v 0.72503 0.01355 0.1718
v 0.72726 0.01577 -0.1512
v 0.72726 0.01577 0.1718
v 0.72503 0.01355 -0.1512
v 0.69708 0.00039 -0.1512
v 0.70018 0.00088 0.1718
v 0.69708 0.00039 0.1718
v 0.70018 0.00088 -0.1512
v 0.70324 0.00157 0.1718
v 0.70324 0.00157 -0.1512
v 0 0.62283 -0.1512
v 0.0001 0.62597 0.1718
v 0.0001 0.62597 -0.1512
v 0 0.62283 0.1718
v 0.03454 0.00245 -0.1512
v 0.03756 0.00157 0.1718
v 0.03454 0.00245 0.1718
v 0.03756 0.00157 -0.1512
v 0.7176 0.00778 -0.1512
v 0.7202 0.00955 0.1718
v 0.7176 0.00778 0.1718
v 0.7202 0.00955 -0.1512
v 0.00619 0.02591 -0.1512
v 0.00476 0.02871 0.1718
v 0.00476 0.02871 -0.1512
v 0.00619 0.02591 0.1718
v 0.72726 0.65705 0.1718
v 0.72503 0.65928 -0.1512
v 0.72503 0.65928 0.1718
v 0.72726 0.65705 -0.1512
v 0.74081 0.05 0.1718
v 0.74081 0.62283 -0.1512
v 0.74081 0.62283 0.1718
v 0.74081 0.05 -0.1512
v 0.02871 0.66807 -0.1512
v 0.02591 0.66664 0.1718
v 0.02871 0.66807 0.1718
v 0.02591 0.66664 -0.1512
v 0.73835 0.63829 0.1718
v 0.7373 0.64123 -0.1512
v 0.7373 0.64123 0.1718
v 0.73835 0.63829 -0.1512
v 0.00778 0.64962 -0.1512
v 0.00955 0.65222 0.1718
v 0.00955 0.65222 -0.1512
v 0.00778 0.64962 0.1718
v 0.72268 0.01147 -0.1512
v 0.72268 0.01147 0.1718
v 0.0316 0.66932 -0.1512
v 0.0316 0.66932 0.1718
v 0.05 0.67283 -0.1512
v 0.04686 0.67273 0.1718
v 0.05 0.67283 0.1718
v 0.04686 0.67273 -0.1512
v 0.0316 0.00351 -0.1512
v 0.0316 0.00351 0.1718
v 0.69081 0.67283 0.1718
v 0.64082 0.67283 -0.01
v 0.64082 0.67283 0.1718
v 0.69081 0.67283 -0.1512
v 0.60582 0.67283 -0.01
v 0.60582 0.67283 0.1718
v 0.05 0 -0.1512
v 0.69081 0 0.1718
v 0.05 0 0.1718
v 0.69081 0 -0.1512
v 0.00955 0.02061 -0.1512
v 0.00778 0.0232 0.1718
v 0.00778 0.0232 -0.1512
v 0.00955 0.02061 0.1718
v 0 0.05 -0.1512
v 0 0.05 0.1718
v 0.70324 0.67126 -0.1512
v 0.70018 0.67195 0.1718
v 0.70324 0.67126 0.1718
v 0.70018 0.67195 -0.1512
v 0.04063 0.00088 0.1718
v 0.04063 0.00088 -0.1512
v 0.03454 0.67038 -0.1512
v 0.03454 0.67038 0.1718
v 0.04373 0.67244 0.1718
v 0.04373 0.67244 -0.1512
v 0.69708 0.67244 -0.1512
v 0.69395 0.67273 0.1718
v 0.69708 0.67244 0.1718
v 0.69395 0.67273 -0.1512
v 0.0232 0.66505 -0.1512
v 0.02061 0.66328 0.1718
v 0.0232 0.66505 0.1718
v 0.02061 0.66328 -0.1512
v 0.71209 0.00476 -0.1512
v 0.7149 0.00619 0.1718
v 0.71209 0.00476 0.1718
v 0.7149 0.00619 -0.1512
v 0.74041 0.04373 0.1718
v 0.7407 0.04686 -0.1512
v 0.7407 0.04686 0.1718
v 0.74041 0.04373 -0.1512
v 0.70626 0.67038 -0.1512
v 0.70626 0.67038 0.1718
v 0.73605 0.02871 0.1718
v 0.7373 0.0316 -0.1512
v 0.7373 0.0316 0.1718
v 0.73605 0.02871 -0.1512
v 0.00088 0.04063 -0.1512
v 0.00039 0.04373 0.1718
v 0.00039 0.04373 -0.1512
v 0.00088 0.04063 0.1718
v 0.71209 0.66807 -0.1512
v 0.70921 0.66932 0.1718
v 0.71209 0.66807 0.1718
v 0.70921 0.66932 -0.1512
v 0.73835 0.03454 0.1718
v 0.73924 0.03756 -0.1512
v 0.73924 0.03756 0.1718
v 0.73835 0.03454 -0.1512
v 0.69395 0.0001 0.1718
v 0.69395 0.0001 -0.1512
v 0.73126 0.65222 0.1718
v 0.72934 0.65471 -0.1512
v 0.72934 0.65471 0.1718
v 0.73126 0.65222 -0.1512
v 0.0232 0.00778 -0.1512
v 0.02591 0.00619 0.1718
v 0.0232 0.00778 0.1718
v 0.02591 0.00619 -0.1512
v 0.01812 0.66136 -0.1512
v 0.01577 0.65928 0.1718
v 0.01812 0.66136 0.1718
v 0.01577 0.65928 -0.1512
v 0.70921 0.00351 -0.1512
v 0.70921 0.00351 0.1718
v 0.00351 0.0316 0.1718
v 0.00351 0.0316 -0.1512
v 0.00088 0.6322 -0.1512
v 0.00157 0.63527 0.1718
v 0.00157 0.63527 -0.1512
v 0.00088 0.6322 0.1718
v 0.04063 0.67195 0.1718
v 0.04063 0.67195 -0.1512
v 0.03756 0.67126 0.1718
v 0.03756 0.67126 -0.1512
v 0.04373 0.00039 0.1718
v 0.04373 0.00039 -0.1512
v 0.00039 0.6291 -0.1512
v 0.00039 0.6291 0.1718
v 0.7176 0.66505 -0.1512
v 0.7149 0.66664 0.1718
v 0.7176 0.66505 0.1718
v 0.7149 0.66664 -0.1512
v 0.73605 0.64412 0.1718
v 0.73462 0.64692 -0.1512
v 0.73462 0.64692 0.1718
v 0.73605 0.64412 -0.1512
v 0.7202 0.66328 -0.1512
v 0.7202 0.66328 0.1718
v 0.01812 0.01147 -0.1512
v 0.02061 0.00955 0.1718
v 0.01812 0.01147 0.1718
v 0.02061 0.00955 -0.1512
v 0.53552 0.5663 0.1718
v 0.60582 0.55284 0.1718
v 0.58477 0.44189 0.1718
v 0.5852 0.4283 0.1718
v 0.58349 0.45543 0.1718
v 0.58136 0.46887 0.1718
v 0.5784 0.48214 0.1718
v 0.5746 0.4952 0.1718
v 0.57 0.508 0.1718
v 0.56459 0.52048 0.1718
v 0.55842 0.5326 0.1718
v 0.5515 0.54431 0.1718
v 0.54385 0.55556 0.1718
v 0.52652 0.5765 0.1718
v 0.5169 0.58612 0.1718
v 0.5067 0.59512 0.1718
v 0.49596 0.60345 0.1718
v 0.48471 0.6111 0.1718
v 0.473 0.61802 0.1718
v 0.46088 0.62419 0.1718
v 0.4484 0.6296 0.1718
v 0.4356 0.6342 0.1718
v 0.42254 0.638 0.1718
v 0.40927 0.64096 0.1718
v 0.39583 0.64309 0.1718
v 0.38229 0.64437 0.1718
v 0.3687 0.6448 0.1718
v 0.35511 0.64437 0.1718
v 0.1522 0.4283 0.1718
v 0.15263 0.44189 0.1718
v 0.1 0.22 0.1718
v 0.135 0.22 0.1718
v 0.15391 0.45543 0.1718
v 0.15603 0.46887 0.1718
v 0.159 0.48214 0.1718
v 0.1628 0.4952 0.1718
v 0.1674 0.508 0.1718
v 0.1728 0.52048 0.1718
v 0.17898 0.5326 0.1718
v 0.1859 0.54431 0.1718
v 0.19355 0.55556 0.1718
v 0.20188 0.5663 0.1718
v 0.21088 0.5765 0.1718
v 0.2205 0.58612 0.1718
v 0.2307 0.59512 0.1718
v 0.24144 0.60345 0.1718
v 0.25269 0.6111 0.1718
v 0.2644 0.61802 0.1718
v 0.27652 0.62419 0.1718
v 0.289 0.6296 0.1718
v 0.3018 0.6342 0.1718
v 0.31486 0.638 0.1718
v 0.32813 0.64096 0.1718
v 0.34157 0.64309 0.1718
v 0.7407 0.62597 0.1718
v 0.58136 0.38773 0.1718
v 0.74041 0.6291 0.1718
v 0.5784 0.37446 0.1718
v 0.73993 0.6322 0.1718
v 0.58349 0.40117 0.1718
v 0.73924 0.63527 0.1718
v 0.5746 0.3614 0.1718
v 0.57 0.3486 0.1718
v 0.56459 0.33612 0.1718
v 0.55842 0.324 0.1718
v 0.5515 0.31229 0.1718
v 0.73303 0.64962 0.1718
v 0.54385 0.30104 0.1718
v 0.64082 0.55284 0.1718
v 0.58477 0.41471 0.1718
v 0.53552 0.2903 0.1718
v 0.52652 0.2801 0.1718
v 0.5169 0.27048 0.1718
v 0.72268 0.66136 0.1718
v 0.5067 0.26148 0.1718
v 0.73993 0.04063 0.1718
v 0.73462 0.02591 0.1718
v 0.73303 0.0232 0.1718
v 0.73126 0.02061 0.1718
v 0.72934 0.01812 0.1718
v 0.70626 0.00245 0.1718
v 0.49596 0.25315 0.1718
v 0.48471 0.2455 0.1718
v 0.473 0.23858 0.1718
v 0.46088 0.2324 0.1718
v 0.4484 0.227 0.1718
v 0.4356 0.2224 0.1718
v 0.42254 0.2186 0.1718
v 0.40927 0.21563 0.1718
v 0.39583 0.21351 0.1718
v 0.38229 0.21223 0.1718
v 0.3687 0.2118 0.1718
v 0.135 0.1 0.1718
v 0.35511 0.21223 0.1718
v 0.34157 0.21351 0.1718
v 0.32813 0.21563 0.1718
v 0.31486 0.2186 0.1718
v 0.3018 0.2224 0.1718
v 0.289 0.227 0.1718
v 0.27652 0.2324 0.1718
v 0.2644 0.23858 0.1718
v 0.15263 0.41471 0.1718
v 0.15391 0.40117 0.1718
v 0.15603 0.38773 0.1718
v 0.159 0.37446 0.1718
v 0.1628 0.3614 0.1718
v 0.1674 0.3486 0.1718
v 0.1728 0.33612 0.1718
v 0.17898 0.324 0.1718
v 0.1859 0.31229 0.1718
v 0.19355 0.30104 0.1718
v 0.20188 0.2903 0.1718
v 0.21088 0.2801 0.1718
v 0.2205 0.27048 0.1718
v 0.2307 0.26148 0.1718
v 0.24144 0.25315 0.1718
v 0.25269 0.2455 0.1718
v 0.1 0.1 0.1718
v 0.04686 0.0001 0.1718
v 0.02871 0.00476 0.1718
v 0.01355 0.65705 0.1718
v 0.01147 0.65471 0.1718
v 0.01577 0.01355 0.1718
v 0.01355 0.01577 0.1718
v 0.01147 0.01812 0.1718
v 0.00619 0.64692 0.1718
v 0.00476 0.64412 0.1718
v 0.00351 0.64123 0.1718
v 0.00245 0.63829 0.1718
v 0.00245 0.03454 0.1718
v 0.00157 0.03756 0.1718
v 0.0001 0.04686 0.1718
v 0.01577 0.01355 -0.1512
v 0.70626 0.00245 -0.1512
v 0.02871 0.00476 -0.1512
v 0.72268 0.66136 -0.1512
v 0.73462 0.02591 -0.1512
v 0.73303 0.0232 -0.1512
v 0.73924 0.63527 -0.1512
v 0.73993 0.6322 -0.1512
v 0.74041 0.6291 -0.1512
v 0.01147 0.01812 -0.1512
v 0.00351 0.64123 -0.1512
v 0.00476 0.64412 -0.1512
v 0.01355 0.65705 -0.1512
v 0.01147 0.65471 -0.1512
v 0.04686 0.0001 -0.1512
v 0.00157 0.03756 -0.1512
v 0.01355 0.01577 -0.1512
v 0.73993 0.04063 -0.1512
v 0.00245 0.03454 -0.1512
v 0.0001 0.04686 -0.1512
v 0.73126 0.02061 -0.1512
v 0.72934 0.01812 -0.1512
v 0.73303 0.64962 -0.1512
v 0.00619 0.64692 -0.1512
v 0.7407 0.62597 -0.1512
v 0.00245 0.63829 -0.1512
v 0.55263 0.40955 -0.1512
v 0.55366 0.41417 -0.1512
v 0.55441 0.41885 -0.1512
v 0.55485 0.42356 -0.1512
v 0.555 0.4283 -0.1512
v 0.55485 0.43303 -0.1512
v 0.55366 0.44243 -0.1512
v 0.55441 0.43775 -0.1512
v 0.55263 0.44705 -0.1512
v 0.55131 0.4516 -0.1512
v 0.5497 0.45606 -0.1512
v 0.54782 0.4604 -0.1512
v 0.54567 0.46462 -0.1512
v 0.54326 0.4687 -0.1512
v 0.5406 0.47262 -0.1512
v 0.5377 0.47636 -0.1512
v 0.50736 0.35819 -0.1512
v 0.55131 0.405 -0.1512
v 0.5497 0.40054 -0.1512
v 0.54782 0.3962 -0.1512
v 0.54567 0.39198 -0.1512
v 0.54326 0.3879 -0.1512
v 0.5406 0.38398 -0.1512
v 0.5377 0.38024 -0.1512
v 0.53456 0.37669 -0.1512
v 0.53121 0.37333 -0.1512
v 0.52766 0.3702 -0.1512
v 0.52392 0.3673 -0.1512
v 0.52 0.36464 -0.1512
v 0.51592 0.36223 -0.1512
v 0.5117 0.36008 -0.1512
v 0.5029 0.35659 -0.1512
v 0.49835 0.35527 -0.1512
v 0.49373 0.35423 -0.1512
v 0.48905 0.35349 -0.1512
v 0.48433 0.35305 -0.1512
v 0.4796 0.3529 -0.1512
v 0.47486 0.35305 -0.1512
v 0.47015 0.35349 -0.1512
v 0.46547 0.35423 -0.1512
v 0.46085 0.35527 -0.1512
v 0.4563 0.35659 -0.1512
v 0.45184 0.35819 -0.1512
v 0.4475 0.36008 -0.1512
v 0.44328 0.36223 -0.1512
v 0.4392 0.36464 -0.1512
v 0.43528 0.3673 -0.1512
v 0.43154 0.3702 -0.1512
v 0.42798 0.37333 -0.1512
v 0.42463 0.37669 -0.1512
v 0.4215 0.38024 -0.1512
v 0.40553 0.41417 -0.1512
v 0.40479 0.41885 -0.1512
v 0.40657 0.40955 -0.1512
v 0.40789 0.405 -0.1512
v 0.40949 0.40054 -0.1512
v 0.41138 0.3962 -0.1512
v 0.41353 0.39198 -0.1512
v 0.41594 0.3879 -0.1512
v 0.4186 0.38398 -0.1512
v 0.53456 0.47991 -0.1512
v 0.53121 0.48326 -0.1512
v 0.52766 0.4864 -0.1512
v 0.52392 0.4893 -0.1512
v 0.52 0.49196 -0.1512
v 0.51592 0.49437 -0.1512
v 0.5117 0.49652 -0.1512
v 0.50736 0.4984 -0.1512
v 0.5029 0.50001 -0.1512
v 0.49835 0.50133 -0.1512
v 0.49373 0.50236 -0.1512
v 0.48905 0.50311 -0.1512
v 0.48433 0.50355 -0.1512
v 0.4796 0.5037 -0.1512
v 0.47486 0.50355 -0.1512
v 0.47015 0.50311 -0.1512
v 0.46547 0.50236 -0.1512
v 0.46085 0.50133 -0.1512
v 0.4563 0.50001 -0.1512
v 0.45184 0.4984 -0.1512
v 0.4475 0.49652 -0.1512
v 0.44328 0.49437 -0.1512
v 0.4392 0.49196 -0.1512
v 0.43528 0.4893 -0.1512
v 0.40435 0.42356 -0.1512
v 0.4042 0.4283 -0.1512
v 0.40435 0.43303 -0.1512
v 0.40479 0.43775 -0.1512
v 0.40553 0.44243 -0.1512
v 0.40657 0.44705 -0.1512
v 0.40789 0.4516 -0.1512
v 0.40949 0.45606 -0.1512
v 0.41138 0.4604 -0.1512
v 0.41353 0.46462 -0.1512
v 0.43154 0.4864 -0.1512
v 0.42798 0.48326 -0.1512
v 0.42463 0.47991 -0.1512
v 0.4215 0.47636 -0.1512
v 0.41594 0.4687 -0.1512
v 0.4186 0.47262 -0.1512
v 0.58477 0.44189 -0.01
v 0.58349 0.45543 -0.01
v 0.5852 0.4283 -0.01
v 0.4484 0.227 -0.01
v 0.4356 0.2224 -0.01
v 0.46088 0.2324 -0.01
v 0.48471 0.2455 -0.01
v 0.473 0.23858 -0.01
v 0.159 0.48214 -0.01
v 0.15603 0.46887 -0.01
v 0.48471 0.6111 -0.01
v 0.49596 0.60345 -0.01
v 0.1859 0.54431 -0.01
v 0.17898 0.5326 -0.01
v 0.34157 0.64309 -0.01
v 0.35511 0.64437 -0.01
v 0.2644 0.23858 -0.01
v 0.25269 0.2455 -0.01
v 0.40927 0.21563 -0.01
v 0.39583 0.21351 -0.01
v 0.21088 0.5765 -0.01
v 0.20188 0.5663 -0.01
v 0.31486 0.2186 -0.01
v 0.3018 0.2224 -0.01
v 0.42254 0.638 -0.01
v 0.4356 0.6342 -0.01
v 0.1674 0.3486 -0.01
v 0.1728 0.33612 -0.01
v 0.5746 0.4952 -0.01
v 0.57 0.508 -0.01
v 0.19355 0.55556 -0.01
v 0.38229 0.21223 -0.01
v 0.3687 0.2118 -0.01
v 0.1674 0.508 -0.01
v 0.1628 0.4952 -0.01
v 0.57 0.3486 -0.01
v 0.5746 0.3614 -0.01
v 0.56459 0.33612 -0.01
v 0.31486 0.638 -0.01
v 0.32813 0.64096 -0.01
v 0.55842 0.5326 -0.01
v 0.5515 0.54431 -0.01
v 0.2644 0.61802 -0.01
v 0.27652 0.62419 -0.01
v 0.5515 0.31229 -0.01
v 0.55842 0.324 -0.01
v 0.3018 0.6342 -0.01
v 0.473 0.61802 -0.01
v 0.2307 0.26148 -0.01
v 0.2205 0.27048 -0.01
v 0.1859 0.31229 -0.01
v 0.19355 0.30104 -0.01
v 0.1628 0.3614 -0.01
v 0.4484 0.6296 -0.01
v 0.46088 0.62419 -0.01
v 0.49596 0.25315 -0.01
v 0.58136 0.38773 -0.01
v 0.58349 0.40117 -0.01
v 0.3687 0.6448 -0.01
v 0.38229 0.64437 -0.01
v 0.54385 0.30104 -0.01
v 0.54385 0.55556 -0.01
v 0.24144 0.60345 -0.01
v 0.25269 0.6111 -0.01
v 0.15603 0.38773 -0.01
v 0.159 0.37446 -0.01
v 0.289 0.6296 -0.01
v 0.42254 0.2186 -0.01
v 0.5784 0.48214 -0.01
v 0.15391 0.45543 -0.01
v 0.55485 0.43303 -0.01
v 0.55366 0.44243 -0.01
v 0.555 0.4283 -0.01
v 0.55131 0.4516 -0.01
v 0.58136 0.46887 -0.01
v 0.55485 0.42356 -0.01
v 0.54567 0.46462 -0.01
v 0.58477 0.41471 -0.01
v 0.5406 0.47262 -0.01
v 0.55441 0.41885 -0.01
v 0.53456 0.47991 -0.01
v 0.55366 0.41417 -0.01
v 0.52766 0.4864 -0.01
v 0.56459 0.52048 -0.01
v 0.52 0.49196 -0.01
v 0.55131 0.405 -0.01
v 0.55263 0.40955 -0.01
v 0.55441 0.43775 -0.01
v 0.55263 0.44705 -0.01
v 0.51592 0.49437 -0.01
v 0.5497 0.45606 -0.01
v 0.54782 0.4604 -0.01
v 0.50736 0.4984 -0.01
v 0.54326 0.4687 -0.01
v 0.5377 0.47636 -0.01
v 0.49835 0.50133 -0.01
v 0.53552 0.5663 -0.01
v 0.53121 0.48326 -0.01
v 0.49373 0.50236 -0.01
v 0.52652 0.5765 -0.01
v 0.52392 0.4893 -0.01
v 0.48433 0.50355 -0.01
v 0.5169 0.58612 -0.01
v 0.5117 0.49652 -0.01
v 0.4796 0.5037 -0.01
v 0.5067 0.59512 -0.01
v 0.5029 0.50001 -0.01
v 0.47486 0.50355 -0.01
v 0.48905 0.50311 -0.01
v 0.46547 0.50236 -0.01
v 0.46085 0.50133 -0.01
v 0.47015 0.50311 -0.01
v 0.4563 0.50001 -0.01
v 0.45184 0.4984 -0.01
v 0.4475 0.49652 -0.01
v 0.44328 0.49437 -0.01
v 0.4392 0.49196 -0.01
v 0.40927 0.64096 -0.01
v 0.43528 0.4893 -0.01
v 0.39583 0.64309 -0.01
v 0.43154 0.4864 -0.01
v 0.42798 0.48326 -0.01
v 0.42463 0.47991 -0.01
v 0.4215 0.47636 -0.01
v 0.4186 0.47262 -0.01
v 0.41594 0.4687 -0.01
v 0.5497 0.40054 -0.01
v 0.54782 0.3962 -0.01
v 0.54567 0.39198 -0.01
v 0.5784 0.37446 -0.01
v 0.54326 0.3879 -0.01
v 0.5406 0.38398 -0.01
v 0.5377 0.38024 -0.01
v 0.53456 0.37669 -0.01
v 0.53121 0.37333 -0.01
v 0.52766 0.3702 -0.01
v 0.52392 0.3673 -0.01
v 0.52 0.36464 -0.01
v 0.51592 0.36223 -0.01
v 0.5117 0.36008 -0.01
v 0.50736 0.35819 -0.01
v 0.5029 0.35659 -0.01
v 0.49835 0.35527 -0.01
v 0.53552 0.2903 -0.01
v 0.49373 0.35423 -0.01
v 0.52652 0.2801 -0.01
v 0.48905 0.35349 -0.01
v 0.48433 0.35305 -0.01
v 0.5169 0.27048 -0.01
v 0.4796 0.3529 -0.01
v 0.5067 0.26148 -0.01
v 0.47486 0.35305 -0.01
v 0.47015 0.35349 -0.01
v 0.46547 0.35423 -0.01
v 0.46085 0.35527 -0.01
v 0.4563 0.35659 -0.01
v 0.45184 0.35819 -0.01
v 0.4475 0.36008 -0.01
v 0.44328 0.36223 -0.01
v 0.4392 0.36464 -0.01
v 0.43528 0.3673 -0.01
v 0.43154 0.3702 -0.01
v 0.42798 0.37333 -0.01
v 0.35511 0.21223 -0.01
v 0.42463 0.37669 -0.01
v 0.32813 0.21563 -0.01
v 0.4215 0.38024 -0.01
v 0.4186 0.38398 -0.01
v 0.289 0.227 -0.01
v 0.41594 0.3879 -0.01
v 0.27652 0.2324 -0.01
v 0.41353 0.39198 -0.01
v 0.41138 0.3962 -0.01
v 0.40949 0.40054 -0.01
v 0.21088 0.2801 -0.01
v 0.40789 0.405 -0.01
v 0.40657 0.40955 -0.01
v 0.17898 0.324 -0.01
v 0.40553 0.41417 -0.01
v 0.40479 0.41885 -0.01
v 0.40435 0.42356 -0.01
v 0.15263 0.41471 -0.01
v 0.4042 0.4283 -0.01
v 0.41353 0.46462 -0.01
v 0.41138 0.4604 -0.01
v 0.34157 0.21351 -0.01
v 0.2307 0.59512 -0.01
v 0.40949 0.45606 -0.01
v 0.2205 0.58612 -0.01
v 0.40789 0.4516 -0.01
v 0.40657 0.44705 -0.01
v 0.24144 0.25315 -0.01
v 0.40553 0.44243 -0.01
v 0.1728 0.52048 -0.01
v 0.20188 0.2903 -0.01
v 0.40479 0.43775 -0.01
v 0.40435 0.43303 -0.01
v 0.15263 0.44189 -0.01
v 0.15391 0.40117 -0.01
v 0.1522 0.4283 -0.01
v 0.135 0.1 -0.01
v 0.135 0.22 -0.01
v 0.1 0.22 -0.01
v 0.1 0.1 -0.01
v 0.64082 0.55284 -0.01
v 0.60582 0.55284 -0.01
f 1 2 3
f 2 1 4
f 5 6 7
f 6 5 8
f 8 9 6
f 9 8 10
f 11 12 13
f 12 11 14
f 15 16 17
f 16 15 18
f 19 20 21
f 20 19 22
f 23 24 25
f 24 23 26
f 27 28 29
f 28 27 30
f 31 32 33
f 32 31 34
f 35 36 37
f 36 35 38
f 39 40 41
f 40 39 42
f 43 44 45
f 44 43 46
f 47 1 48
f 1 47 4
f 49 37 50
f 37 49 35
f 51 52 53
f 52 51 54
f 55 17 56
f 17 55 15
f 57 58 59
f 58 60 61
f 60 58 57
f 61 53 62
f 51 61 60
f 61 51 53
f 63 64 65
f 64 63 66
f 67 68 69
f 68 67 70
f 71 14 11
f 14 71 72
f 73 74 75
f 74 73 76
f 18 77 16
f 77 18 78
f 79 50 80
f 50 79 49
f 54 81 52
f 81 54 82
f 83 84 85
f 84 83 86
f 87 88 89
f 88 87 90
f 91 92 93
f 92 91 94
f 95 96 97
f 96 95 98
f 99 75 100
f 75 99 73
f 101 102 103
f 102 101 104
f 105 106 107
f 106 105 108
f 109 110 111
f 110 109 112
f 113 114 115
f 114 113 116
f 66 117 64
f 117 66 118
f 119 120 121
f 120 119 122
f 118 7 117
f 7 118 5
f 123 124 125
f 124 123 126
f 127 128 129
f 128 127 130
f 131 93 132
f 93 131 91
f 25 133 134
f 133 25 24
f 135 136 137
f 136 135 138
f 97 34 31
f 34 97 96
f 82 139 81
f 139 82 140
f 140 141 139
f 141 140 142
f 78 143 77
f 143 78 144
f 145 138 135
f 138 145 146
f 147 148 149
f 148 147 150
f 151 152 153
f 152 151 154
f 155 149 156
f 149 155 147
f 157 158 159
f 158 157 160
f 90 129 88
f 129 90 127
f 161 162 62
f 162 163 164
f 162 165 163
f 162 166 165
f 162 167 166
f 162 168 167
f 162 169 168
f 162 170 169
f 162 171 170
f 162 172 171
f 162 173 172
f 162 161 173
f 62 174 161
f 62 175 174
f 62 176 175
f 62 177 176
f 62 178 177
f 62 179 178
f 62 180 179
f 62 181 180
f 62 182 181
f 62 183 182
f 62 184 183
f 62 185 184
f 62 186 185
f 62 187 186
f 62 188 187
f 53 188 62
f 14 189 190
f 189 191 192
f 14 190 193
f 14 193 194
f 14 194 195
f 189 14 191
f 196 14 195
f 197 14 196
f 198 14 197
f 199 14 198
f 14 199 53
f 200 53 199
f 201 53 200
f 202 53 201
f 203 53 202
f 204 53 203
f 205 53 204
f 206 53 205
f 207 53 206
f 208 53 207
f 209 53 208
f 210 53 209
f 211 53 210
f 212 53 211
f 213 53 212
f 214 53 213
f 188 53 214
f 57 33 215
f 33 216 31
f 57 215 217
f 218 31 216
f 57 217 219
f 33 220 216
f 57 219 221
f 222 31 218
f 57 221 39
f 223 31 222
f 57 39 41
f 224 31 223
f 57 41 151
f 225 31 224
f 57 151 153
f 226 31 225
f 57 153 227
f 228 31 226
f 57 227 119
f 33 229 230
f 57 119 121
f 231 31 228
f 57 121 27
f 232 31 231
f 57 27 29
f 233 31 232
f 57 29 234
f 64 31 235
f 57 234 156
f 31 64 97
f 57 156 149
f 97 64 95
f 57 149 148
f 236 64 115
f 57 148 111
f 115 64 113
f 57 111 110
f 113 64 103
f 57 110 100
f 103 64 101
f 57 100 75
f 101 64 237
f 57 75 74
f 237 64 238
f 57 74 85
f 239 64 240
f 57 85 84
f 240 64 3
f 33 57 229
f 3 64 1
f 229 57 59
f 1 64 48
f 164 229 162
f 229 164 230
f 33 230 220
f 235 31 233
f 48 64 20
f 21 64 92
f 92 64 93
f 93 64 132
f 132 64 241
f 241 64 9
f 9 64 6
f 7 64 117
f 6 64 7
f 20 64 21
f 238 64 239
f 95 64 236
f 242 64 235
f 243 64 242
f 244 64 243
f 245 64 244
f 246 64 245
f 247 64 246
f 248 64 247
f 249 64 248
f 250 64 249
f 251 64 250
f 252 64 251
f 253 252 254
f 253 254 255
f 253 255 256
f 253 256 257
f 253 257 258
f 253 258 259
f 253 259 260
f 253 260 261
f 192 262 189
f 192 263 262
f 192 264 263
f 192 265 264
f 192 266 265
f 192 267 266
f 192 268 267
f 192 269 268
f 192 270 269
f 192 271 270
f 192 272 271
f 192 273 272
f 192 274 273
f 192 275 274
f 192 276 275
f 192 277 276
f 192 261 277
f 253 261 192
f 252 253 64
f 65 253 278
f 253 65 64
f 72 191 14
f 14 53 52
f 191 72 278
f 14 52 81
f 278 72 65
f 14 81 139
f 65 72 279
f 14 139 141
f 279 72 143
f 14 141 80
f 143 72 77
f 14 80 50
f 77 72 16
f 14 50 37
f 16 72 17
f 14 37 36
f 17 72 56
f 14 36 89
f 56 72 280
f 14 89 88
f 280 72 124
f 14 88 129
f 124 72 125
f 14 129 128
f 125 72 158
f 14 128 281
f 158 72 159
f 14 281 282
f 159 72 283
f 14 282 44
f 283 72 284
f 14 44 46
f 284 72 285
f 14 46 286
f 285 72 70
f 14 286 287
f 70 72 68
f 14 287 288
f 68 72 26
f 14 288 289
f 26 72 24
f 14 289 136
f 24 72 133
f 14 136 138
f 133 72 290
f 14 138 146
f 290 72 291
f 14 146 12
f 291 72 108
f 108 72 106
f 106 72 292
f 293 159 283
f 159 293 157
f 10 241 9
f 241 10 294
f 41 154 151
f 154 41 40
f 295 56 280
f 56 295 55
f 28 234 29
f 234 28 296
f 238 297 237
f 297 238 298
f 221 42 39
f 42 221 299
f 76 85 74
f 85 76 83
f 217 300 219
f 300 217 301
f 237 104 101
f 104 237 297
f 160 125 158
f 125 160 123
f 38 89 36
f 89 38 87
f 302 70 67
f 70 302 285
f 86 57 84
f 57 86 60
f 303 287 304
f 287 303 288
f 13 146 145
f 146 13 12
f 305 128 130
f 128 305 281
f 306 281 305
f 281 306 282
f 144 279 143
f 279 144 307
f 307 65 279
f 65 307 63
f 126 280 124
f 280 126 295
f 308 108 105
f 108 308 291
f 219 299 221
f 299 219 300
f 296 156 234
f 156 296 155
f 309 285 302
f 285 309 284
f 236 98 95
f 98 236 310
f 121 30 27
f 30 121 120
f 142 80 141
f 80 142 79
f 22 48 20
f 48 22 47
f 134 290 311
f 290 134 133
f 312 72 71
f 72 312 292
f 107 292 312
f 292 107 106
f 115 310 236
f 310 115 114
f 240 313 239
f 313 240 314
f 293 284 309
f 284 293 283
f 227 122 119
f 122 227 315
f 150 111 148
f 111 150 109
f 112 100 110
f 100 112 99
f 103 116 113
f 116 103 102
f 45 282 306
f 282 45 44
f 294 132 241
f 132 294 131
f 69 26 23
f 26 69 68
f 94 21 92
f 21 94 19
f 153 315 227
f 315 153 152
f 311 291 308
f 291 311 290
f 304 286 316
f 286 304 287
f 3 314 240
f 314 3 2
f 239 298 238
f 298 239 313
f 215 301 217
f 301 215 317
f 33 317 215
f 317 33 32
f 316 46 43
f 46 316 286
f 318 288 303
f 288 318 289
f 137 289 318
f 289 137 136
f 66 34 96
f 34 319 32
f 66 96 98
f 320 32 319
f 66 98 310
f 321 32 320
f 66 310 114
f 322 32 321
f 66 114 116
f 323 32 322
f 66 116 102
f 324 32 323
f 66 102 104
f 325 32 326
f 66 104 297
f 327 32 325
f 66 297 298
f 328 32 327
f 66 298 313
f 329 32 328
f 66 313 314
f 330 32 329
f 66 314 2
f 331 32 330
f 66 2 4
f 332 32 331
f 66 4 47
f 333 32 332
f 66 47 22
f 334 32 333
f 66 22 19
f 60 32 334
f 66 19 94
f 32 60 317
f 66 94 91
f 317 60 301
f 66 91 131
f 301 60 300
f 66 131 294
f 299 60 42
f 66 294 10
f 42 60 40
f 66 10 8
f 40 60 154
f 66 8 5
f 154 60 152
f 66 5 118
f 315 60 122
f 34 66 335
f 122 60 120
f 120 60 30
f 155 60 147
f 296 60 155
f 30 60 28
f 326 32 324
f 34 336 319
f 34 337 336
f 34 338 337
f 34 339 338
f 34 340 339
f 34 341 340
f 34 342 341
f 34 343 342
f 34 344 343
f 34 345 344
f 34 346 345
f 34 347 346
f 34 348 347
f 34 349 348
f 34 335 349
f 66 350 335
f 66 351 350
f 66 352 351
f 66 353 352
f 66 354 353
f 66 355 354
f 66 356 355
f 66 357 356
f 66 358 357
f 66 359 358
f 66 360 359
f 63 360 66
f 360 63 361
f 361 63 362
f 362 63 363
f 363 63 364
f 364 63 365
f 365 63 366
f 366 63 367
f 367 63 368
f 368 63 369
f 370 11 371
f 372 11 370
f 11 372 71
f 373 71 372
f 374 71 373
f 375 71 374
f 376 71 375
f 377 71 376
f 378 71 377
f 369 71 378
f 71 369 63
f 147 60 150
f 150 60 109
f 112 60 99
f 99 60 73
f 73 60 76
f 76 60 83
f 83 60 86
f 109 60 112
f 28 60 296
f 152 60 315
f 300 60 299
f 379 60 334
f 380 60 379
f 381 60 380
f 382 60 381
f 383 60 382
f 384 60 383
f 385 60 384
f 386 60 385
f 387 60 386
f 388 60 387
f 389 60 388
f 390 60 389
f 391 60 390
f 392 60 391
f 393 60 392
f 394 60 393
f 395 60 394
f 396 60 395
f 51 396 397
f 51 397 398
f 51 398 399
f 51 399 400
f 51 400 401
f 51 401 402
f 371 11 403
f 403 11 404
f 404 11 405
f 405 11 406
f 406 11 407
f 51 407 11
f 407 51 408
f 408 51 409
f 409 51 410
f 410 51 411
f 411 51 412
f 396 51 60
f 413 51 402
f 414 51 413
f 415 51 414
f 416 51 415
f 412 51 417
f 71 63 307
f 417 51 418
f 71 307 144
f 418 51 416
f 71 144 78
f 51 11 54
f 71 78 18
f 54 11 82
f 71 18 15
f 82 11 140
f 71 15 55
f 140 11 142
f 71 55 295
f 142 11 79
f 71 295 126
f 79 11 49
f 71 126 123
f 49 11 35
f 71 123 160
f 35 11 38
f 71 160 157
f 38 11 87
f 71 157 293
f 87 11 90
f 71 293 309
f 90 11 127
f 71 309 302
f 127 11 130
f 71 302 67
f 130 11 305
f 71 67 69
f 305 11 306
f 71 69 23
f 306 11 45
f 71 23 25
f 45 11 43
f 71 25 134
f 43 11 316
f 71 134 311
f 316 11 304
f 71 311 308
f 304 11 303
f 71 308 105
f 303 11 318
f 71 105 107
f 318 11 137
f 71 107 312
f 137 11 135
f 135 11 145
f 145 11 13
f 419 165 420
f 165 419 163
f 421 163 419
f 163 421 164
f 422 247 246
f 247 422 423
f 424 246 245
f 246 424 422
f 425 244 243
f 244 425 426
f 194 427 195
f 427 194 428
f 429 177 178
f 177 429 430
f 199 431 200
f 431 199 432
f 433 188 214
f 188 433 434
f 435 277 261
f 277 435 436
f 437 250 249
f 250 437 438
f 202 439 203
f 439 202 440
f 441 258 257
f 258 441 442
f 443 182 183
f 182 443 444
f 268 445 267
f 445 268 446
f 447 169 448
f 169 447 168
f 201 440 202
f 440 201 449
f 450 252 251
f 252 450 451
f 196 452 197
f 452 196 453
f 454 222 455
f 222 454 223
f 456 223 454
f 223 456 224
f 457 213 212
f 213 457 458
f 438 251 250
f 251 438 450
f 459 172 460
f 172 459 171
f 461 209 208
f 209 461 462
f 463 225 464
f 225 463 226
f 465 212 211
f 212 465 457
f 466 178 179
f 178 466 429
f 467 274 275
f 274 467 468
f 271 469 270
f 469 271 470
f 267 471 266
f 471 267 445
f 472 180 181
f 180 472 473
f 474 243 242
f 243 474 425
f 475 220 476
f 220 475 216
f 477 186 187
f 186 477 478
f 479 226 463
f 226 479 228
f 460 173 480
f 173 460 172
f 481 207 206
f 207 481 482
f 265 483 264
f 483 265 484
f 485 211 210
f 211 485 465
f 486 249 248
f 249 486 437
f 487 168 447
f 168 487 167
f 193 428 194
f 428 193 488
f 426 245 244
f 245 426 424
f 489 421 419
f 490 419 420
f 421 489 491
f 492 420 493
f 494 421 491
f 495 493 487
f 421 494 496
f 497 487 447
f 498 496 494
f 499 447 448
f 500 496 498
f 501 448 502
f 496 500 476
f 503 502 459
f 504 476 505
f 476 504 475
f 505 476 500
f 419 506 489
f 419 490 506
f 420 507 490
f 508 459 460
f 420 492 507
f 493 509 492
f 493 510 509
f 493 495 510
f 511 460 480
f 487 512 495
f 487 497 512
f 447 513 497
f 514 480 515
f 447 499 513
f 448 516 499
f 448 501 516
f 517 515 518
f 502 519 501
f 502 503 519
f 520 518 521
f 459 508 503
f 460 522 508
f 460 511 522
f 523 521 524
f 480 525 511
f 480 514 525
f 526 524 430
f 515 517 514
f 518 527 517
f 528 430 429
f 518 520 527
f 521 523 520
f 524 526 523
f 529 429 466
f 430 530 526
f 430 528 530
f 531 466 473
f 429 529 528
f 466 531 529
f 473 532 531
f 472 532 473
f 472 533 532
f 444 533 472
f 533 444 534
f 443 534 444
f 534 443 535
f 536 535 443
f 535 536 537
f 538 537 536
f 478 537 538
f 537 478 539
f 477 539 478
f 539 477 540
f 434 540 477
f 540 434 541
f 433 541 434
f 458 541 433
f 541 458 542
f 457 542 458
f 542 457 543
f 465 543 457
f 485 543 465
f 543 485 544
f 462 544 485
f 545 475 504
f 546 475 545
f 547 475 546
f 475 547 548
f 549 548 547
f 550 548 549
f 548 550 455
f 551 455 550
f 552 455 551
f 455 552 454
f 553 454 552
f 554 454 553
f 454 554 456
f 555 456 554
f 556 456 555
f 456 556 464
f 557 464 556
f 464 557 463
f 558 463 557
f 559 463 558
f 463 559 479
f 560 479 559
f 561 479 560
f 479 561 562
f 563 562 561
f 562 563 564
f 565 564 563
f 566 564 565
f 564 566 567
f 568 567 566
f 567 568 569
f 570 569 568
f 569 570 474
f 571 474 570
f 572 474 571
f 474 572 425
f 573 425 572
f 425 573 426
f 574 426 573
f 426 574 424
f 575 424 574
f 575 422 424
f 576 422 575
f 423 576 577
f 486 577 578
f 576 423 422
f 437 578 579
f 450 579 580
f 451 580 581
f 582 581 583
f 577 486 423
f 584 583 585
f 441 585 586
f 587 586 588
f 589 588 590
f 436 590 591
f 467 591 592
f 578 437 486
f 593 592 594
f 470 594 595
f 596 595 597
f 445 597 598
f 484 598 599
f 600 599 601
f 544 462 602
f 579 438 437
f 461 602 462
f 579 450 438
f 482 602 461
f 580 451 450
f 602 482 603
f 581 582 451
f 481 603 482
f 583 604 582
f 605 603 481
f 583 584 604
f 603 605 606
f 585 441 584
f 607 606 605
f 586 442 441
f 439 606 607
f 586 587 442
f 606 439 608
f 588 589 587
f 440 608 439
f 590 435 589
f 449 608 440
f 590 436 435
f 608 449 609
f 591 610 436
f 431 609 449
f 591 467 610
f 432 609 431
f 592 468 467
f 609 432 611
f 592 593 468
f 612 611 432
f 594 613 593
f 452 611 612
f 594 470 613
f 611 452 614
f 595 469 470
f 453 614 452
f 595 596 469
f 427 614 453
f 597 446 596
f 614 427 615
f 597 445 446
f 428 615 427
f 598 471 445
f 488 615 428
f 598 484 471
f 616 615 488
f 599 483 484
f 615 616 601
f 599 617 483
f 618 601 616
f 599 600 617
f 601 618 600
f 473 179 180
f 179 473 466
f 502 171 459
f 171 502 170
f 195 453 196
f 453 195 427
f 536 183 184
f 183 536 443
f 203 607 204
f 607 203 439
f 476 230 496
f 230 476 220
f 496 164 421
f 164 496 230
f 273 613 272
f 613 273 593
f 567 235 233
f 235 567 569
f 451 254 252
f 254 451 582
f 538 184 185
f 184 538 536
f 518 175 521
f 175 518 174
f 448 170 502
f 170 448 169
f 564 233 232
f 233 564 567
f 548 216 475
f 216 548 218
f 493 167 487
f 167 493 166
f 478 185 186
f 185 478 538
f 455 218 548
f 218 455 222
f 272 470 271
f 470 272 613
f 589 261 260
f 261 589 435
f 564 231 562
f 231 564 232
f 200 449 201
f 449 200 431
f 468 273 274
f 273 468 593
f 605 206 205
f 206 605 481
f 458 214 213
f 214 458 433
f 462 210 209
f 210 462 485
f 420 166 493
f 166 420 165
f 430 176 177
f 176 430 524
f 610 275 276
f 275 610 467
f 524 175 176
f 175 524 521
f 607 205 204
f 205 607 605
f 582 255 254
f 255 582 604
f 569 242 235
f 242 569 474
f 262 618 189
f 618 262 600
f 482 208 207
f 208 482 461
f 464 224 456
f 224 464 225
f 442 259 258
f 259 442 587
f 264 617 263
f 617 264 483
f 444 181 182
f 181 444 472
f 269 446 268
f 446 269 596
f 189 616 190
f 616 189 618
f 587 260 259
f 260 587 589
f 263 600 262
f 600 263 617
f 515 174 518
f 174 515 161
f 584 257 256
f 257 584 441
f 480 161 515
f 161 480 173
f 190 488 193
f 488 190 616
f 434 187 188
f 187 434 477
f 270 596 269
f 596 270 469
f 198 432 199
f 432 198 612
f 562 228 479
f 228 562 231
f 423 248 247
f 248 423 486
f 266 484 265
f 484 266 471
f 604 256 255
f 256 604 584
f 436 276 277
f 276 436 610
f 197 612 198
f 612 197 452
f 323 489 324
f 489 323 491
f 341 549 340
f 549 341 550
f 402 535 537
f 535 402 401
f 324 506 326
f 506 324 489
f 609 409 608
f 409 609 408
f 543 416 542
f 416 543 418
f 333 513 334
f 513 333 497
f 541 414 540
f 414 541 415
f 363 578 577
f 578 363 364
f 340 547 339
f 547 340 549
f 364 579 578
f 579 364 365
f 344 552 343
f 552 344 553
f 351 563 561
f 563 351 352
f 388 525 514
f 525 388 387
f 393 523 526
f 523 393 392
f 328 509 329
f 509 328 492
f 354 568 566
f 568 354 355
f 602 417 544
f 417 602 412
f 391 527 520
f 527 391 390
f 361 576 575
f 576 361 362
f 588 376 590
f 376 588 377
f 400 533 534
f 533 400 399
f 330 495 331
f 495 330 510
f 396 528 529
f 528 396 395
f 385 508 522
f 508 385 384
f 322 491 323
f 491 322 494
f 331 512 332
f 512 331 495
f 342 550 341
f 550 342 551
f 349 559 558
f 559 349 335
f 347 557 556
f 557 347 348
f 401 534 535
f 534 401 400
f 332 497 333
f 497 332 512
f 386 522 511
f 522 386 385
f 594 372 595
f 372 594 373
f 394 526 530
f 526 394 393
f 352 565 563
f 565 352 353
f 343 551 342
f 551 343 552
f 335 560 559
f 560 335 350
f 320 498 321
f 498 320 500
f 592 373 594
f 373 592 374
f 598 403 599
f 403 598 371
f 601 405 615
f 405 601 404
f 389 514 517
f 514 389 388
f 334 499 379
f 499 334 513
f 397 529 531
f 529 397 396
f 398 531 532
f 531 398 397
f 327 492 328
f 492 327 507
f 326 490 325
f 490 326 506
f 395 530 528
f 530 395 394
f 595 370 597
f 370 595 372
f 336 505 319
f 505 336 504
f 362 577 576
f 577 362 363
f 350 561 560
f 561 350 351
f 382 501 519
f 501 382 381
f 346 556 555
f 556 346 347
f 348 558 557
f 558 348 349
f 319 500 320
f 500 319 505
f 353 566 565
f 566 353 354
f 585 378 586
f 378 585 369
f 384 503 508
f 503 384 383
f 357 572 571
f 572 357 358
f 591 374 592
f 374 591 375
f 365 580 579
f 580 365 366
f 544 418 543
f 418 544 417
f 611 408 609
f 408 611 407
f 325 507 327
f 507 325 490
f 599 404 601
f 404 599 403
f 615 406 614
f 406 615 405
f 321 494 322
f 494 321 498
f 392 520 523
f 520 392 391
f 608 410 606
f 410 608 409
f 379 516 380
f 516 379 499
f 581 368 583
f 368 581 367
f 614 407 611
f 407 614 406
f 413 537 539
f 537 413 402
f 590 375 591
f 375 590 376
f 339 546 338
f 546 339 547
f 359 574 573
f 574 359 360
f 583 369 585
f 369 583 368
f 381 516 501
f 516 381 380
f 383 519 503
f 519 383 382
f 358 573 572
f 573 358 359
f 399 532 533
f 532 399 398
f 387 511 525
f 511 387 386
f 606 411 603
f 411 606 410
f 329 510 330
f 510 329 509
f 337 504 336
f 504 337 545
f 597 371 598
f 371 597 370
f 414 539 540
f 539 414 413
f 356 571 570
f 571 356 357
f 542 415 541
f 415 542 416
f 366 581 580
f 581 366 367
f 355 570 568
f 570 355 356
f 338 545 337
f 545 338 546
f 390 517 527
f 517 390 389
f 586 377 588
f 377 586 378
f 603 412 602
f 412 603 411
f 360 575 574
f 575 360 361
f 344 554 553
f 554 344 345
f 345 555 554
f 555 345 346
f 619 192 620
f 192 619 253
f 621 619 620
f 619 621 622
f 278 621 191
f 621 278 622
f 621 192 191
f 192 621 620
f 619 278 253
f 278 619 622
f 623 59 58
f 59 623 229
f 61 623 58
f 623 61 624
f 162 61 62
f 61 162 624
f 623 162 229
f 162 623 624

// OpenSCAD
// OpenSCAD Parametric Model: Rounded Wedge Base with Features
$fn = 100;

// === DIMENSIONAL PARAMETERS ===
base_len = 0.740822;
base_wid = 0.672842;
base_hgt = 0.171797;
corner_r = 0.05;

cen_x = 0.3687;
cen_y = 0.4283;
cen_r  = 0.2165;

up_x = 0.3688;
up_y = 0.4282;
up_r = 0.2165;
up_hgt = 0.020616;

web_x1 = 0.3434;
web_y1 = 0.2119;
web_len = 0.025368;
web_wid = 0.432873;
web_hgt = base_hgt;

sm_x = 0.4796;
sm_y = 0.4282;
sm_r = 0.0754;
sm_hgt = base_hgt;

rec_x = 0.4796;
rec_y = 0.4283;
rec_r = 0.0754;
rec_z_top = 0.0206;
rec_z_bot = -0.1512;

pad_hgt = 0.1512;

// === GEOMETRY MODULES ===

module base_footprint() {
    translate([corner_r, corner_r])
        offset(r=corner_r)
            square([base_len - 2*corner_r, base_wid - 2*corner_r]);
}

module positive_solid() {
    union() {
        linear_extrude(base_hgt)
            base_footprint();

        translate([0, 0, -pad_hgt])
            linear_extrude(pad_hgt)
                base_footprint();

        translate([web_x1, web_y1, 0])
            cube([web_len, web_wid, web_hgt]);

        translate([sm_x, sm_y, 0])
            cylinder(h=sm_hgt, r=sm_r);

        translate([up_x, up_y, base_hgt])
            difference() {
                cylinder(h=up_hgt, r=up_r);
                translate([0, 0, -0.01])
                    cylinder(h=up_hgt + 0.02, r=cen_r);
            }
    }
}

module negative_features() {
    translate([cen_x, cen_y, -0.01])
        cylinder(h=base_hgt + up_hgt + 0.02, r=cen_r);

    translate([rec_x, rec_y, rec_z_bot])
        cylinder(h=rec_z_top - rec_z_bot, r=rec_r);

    translate([0.10, 0.10, -0.01])
        cube([0.035, 0.12, base_hgt + 0.02]);

    translate([base_len - 0.135, base_wid - 0.12, -0.01])
        cube([0.035, 0.12, base_hgt + 0.02]);
}

// === FINAL ASSEMBLY ===
difference() {
    positive_solid();
    negative_features();
}
